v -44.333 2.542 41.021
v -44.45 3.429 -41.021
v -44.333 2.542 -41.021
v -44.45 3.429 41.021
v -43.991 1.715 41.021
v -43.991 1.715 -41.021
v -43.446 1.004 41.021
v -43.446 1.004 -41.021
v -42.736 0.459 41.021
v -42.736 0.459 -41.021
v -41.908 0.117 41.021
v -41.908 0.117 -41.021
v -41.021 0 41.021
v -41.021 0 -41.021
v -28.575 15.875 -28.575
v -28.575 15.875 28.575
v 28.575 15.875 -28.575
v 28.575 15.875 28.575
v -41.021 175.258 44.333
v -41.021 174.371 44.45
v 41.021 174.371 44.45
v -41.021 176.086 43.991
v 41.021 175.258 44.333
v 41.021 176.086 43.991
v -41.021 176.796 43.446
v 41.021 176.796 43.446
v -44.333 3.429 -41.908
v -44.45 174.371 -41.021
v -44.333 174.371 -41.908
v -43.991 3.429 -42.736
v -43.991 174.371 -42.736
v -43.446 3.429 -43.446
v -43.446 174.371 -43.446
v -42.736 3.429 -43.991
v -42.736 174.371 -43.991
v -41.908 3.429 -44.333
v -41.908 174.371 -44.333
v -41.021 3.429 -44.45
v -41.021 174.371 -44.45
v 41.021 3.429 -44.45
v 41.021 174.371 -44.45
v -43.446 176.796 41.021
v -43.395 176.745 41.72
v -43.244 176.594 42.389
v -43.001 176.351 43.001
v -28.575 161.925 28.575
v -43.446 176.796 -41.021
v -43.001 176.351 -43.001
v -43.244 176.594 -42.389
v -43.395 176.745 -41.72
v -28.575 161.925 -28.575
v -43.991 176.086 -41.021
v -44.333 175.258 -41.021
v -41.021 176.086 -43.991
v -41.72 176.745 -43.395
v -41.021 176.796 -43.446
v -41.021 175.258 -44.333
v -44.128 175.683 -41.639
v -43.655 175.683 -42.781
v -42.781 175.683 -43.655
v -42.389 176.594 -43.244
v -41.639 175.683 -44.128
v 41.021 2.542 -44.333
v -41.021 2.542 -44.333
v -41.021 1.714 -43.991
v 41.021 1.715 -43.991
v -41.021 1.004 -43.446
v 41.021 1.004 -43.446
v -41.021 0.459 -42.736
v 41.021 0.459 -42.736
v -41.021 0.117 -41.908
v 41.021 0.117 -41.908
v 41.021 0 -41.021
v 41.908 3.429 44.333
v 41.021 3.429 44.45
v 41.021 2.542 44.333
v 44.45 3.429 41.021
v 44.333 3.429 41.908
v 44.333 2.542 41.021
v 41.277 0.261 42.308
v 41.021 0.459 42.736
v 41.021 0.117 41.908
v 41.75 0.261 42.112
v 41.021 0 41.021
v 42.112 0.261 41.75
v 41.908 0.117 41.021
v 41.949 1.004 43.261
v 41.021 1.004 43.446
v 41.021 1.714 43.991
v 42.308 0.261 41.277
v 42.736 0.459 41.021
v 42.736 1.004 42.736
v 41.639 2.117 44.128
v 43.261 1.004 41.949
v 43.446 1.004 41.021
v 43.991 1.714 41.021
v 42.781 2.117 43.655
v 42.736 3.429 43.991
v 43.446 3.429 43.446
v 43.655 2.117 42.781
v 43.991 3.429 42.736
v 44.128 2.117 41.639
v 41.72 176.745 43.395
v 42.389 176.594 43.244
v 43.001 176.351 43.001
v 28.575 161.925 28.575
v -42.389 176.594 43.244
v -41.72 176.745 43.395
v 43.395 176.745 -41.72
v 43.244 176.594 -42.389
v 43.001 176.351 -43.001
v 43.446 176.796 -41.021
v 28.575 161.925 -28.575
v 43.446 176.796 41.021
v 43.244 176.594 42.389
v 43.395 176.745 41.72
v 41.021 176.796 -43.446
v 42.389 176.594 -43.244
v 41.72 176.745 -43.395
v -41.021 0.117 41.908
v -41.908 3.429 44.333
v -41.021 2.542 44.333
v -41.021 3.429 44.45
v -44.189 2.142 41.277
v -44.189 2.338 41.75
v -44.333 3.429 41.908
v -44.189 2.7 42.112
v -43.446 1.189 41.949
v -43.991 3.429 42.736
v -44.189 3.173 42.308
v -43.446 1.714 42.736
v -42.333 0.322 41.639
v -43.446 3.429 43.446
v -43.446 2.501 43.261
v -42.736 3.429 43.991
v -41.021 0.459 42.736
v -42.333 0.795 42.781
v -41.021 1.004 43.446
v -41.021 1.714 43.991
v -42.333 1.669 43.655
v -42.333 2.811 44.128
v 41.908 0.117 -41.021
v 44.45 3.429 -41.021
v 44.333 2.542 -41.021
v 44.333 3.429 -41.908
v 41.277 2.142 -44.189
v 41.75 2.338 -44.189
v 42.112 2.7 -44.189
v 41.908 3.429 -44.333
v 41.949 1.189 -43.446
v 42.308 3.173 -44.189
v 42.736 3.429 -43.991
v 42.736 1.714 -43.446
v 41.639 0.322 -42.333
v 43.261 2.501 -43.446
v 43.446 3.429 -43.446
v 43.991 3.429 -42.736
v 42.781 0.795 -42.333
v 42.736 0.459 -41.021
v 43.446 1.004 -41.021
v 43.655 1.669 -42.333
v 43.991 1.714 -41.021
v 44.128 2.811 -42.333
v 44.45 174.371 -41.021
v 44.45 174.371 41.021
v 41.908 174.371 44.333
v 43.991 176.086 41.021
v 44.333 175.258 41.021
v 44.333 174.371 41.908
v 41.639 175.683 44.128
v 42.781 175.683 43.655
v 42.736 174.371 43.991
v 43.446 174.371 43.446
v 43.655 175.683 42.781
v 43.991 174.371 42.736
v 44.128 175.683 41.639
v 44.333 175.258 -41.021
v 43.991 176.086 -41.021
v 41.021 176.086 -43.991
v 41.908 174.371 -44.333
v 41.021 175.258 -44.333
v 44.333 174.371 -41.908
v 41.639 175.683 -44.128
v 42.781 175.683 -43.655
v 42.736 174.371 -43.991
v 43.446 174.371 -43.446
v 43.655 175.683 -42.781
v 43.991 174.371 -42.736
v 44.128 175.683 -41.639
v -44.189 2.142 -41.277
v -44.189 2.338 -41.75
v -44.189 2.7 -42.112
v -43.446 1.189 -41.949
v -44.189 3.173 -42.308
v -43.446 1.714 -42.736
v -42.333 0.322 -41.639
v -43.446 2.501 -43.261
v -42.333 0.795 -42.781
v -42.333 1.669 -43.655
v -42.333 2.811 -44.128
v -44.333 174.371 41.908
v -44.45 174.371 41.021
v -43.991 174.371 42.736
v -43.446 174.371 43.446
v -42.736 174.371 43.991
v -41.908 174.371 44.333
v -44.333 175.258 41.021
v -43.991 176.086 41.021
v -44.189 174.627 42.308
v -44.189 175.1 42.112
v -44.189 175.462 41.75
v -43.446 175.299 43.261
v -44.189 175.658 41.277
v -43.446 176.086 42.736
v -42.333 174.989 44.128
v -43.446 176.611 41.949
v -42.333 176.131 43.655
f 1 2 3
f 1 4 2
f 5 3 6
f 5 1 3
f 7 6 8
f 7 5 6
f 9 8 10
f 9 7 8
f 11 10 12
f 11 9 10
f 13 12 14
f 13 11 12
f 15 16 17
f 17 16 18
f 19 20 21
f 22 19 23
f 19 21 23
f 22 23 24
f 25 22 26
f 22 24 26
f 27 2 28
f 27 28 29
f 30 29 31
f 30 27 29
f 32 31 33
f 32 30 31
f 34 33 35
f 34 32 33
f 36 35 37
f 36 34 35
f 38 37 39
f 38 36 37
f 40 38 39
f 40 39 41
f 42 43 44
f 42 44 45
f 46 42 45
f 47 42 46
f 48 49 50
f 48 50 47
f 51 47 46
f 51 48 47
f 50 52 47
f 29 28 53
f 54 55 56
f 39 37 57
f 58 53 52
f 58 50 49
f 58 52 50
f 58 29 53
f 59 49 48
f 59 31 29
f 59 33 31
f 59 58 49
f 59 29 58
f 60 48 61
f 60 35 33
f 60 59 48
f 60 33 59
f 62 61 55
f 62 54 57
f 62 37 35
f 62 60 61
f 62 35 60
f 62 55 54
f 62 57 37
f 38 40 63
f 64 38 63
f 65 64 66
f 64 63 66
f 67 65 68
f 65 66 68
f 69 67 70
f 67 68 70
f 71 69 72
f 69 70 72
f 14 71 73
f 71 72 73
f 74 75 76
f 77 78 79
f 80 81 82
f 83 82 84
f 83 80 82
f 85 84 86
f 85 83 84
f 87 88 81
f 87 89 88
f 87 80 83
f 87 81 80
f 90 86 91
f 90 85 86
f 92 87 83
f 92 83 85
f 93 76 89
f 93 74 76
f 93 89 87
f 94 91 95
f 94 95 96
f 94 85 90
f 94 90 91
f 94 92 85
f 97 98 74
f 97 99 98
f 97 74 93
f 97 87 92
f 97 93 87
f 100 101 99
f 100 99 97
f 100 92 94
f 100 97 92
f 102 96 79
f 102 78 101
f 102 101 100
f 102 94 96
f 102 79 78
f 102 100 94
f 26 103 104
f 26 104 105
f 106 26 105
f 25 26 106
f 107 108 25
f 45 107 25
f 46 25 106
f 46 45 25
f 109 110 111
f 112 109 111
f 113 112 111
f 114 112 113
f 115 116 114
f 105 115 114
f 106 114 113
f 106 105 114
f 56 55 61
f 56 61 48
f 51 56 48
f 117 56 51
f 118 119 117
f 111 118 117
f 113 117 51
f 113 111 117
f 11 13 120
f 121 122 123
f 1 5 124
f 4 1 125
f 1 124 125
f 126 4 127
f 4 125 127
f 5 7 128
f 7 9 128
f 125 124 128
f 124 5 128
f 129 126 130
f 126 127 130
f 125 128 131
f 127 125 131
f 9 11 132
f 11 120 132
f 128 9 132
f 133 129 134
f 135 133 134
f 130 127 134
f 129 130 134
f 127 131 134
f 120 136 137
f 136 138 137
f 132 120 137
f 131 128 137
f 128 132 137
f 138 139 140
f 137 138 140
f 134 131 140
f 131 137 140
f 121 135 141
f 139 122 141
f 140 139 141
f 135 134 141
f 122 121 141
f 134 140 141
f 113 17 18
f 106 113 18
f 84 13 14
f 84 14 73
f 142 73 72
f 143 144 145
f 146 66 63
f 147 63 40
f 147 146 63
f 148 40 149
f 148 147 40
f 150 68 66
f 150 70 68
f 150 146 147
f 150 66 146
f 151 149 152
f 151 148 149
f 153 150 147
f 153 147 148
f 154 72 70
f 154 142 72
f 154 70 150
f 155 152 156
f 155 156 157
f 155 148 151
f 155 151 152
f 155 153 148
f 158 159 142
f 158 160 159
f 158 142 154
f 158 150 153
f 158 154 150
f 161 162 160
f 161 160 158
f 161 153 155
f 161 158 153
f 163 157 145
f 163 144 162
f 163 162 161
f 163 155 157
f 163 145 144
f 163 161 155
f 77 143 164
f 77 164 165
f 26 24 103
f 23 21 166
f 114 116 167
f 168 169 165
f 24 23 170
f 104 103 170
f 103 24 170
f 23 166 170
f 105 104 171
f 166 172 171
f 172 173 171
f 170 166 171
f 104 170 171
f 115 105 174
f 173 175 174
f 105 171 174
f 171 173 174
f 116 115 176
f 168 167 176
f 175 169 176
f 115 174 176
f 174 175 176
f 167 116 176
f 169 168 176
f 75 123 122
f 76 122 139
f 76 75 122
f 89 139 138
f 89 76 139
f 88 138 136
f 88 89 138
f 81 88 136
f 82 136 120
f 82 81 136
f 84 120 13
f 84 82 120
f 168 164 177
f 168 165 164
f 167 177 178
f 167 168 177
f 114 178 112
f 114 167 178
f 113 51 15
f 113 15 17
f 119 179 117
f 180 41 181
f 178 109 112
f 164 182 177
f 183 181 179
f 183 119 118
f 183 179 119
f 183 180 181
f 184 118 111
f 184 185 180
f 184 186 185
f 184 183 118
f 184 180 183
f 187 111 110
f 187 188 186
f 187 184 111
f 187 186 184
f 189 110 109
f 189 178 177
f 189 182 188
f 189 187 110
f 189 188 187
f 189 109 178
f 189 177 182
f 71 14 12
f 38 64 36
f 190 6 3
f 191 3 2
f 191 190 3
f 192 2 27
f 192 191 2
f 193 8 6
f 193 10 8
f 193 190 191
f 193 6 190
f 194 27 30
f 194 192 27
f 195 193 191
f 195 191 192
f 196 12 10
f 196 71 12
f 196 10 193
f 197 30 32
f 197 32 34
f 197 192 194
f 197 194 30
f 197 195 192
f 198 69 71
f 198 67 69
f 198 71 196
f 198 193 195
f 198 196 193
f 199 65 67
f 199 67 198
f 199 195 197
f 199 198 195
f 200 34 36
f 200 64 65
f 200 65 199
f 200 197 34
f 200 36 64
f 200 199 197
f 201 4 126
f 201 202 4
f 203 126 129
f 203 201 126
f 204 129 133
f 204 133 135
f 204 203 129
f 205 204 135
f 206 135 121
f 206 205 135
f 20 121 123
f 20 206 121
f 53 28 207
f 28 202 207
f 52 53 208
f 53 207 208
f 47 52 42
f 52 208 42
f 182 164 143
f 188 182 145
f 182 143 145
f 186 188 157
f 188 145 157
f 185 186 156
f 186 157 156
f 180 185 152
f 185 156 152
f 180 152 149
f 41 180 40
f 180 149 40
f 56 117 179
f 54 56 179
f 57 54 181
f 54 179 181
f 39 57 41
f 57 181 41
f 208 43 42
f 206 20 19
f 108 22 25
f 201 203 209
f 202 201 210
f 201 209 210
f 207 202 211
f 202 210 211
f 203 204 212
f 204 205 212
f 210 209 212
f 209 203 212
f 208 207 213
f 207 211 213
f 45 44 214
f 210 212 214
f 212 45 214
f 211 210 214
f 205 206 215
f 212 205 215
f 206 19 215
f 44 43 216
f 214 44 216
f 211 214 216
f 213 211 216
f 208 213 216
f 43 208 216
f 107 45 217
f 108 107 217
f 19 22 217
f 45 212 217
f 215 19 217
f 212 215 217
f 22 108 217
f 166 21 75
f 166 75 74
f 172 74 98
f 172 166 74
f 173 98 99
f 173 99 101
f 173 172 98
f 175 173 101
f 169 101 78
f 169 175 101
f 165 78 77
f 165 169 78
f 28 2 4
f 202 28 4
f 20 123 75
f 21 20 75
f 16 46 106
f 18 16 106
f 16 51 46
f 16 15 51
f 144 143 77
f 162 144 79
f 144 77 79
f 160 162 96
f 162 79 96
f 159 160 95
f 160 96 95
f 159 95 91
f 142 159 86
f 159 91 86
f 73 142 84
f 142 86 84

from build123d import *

# Parameters (mm, degrees)
F0_W         = 88.9
F0_H         = 88.9
F0_W_2       = 57.15
F0_H_2       = 57.15
F1_DEPTH     = 177.8
F2_DEPTH     = 15.875
F3_R         = 3.429
F4_T1_DEPTH  = 57.15
F4_T3_DEPTH  = 57.15
F4_T9_DEPTH  = 97.975467434
F4_T13_DEPTH = 97.975467434
F4_T20_DEPTH = 97.975467434
F4_T24_DEPTH = 97.975467434
F4_T31_DEPTH = 97.975467434
F4_T35_DEPTH = 97.975467434
F4_T42_DEPTH = 97.975467434
F4_T46_DEPTH = 97.975467434


# Not quite as in the source:
# - a fillet or chamfer that OpenCascade refuses, or shapes differently, is made with other operations: its cross-section is extruded or revolved along the edge and cut away or added


with BuildPart() as f1:
    # F0 (on Front) → F1 (new body)
    with BuildSketch(Plane.XZ):
        Rectangle(F0_W, F0_H)
        Rectangle(F0_W_2, F0_H_2, mode=Mode.SUBTRACT)
    extrude(amount=-F1_DEPTH)

    # F0 (on Front) → F2 (join)
    with BuildSketch(Plane.XZ):
        Rectangle(F0_W, F0_H)
        Rectangle(F0_W_2, F0_H_2, mode=Mode.SUBTRACT)
        Rectangle(F0_W_2, F0_H_2)
    extrude(amount=-F2_DEPTH)

    # F3
    f3_edges = [f1.edges().sort_by_distance(p)[0] for p in [
        (44.45, 88.9, 44.45),
        (0, 0, 44.45),
        (44.45, 0, 0),
        (0, 0, -44.45),
        (44.45, 88.9, -44.45),
        (-44.45, 0, 0),
        (-44.45, 88.9, -44.45),
        (0, 177.8, 44.45),
        (-44.45, 88.9, 44.45),
        (-44.45, 177.8, 0),
        (0, 177.8, -44.45),
        (44.45, 177.8, 0),
    ]]
    fillet(f3_edges, radius=F3_R)

    # F4: chamfer of 15.875 on 4 edges, made by hand

    # F4_s2 → F4_t1 (cut)
    with BuildSketch(Plane.XY.offset(-28.575)):
        with BuildLine():
            Line((-44.8990128061, 178.2490128061), (-28.1259871939, 161.4759871939))
            Line((-28.1259871939, 161.4759871939), (-27.8084871939, 161.4759871939))
            ThreePointArc((-27.8084871939, 161.4759871939), (-28.2575, 169.637993597), (-28.2575, 177.8))
            Line((-28.2575, 177.8), (-28.575, 178.1175))
            ThreePointArc((-28.575, 178.1175), (-36.737006403, 178.1175), (-44.8990128061, 178.5665128061))
            Line((-44.8990128061, 178.5665128061), (-44.8990128061, 178.2490128061))
        make_face()
        with BuildLine():
            Line((44.8990128061, 178.2490128061), (28.1259871939, 161.4759871939))
            Line((28.1259871939, 161.4759871939), (27.8084871939, 161.4759871939))
            ThreePointArc((27.8084871939, 161.4759871939), (28.2575, 169.637993597), (28.2575, 177.8))
            Line((28.2575, 177.8), (28.575, 178.1175))
            ThreePointArc((28.575, 178.1175), (36.737006403, 178.1175), (44.8990128061, 178.5665128061))
            Line((44.8990128061, 178.5665128061), (44.8990128061, 178.2490128061))
        make_face()
    extrude(amount=F4_T1_DEPTH, mode=Mode.SUBTRACT)

    # F4_s4 → F4_t3 (cut)
    with BuildSketch(Plane.YZ.offset(-28.575)):
        with BuildLine():
            Line((178.2490128061, -44.8990128061), (161.4759871939, -28.1259871939))
            Line((161.4759871939, -28.1259871939), (161.4759871939, -27.8084871939))
            ThreePointArc((161.4759871939, -27.8084871939), (169.637993597, -28.2575), (177.8, -28.2575))
            Line((177.8, -28.2575), (178.1175, -28.575))
            ThreePointArc((178.1175, -28.575), (178.1175, -36.737006403), (178.5665128061, -44.8990128061))
            Line((178.5665128061, -44.8990128061), (178.2490128061, -44.8990128061))
        make_face()
        with BuildLine():
            Line((178.2490128061, 44.8990128061), (161.4759871939, 28.1259871939))
            Line((161.4759871939, 28.1259871939), (161.4759871939, 27.8084871939))
            ThreePointArc((161.4759871939, 27.8084871939), (169.637993597, 28.2575), (177.8, 28.2575))
            Line((177.8, 28.2575), (178.1175, 28.575))
            ThreePointArc((178.1175, 28.575), (178.1175, 36.737006403), (178.5665128061, 44.8990128061))
            Line((178.5665128061, 44.8990128061), (178.2490128061, 44.8990128061))
        make_face()
    extrude(amount=F4_T3_DEPTH, mode=Mode.SUBTRACT)


with BuildPart() as f4_tool7:
    # F4_s8 → F4_t9 (new body)
    with BuildSketch(Plane.XY.offset(-69.400467434)):
        with BuildLine():
            Line((-44.8990128061, 178.2490128061), (-28.1259871939, 161.4759871939))
            Line((-28.1259871939, 161.4759871939), (-27.8084871939, 161.4759871939))
            ThreePointArc((-27.8084871939, 161.4759871939), (-28.2575, 169.637993597), (-28.2575, 177.8))
            Line((-28.2575, 177.8), (-28.575, 178.1175))
            ThreePointArc((-28.575, 178.1175), (-36.737006403, 178.1175), (-44.8990128061, 178.5665128061))
            Line((-44.8990128061, 178.5665128061), (-44.8990128061, 178.2490128061))
        make_face()
    extrude(amount=F4_T9_DEPTH)

    split(bisect_by=Plane.XY.offset(-28.575), keep=Keep.BOTTOM)


with BuildPart() as f4_tool11:
    # F4_s12 → F4_t13 (new body)
    with BuildSketch(Plane.YZ.offset(28.575)):
        with BuildLine():
            Line((178.2490128061, -44.8990128061), (161.4759871939, -28.1259871939))
            Line((161.4759871939, -28.1259871939), (161.4759871939, -27.8084871939))
            ThreePointArc((161.4759871939, -27.8084871939), (169.637993597, -28.2575), (177.8, -28.2575))
            Line((177.8, -28.2575), (178.1175, -28.575))
            ThreePointArc((178.1175, -28.575), (178.1175, -36.737006403), (178.5665128061, -44.8990128061))
            Line((178.5665128061, -44.8990128061), (178.2490128061, -44.8990128061))
        make_face()
    extrude(amount=-F4_T13_DEPTH)

    split(bisect_by=Plane.YZ.offset(-28.575), keep=Keep.BOTTOM)


with BuildPart() as f4_tool7_1:
    add(f4_tool7.part)

    # F4_t15: intersect F4_tool11
    add(f4_tool11.part, mode=Mode.INTERSECT)


with BuildPart() as f1_1:
    add(f1.part)

    # F4_t5: cut F4_tool7
    add(f4_tool7_1.part, mode=Mode.SUBTRACT)


with BuildPart() as f4_tool18:
    # F4_s19 → F4_t20 (new body)
    with BuildSketch(Plane.XY.offset(-28.575)):
        with BuildLine():
            Line((-44.8990128061, 178.2490128061), (-28.1259871939, 161.4759871939))
            Line((-28.1259871939, 161.4759871939), (-27.8084871939, 161.4759871939))
            ThreePointArc((-27.8084871939, 161.4759871939), (-28.2575, 169.637993597), (-28.2575, 177.8))
            Line((-28.2575, 177.8), (-28.575, 178.1175))
            ThreePointArc((-28.575, 178.1175), (-36.737006403, 178.1175), (-44.8990128061, 178.5665128061))
            Line((-44.8990128061, 178.5665128061), (-44.8990128061, 178.2490128061))
        make_face()
    extrude(amount=F4_T20_DEPTH)

    split(bisect_by=Plane.XY.offset(28.575), keep=Keep.TOP)


with BuildPart() as f4_tool22:
    # F4_s23 → F4_t24 (new body)
    with BuildSketch(Plane.YZ.offset(-69.400467434)):
        with BuildLine():
            Line((178.2490128061, 44.8990128061), (161.4759871939, 28.1259871939))
            Line((161.4759871939, 28.1259871939), (161.4759871939, 27.8084871939))
            ThreePointArc((161.4759871939, 27.8084871939), (169.637993597, 28.2575), (177.8, 28.2575))
            Line((177.8, 28.2575), (178.1175, 28.575))
            ThreePointArc((178.1175, 28.575), (178.1175, 36.737006403), (178.5665128061, 44.8990128061))
            Line((178.5665128061, 44.8990128061), (178.2490128061, 44.8990128061))
        make_face()
    extrude(amount=F4_T24_DEPTH)

    split(bisect_by=Plane.YZ.offset(-28.575), keep=Keep.BOTTOM)


with BuildPart() as f4_tool18_1:
    add(f4_tool18.part)

    # F4_t26: intersect F4_tool22
    add(f4_tool22.part, mode=Mode.INTERSECT)


with BuildPart() as f1_2:
    add(f1_1.part)

    # F4_t16: cut F4_tool18
    add(f4_tool18_1.part, mode=Mode.SUBTRACT)


with BuildPart() as f4_tool29:
    # F4_s30 → F4_t31 (new body)
    with BuildSketch(Plane.XY.offset(28.575)):
        with BuildLine():
            Line((44.8990128061, 178.2490128061), (28.1259871939, 161.4759871939))
            Line((28.1259871939, 161.4759871939), (27.8084871939, 161.4759871939))
            ThreePointArc((27.8084871939, 161.4759871939), (28.2575, 169.637993597), (28.2575, 177.8))
            Line((28.2575, 177.8), (28.575, 178.1175))
            ThreePointArc((28.575, 178.1175), (36.737006403, 178.1175), (44.8990128061, 178.5665128061))
            Line((44.8990128061, 178.5665128061), (44.8990128061, 178.2490128061))
        make_face()
    extrude(amount=-F4_T31_DEPTH)

    split(bisect_by=Plane.XY.offset(-28.575), keep=Keep.BOTTOM)


with BuildPart() as f4_tool33:
    # F4_s34 → F4_t35 (new body)
    with BuildSketch(Plane.YZ.offset(69.400467434)):
        with BuildLine():
            Line((178.2490128061, -44.8990128061), (161.4759871939, -28.1259871939))
            Line((161.4759871939, -28.1259871939), (161.4759871939, -27.8084871939))
            ThreePointArc((161.4759871939, -27.8084871939), (169.637993597, -28.2575), (177.8, -28.2575))
            Line((177.8, -28.2575), (178.1175, -28.575))
            ThreePointArc((178.1175, -28.575), (178.1175, -36.737006403), (178.5665128061, -44.8990128061))
            Line((178.5665128061, -44.8990128061), (178.2490128061, -44.8990128061))
        make_face()
    extrude(amount=-F4_T35_DEPTH)

    split(bisect_by=Plane.YZ.offset(28.575), keep=Keep.TOP)


with BuildPart() as f4_tool29_1:
    add(f4_tool29.part)

    # F4_t37: intersect F4_tool33
    add(f4_tool33.part, mode=Mode.INTERSECT)


with BuildPart() as f1_3:
    add(f1_2.part)

    # F4_t27: cut F4_tool29
    add(f4_tool29_1.part, mode=Mode.SUBTRACT)


with BuildPart() as f4_tool40:
    # F4_s41 → F4_t42 (new body)
    with BuildSketch(Plane.YZ.offset(-28.575)):
        with BuildLine():
            Line((178.2490128061, 44.8990128061), (161.4759871939, 28.1259871939))
            Line((161.4759871939, 28.1259871939), (161.4759871939, 27.8084871939))
            ThreePointArc((161.4759871939, 27.8084871939), (169.637993597, 28.2575), (177.8, 28.2575))
            Line((177.8, 28.2575), (178.1175, 28.575))
            ThreePointArc((178.1175, 28.575), (178.1175, 36.737006403), (178.5665128061, 44.8990128061))
            Line((178.5665128061, 44.8990128061), (178.2490128061, 44.8990128061))
        make_face()
    extrude(amount=F4_T42_DEPTH)

    split(bisect_by=Plane.YZ.offset(28.575), keep=Keep.TOP)


with BuildPart() as f4_tool44:
    # F4_s45 → F4_t46 (new body)
    with BuildSketch(Plane.XY.offset(69.400467434)):
        with BuildLine():
            Line((44.8990128061, 178.2490128061), (28.1259871939, 161.4759871939))
            Line((28.1259871939, 161.4759871939), (27.8084871939, 161.4759871939))
            ThreePointArc((27.8084871939, 161.4759871939), (28.2575, 169.637993597), (28.2575, 177.8))
            Line((28.2575, 177.8), (28.575, 178.1175))
            ThreePointArc((28.575, 178.1175), (36.737006403, 178.1175), (44.8990128061, 178.5665128061))
            Line((44.8990128061, 178.5665128061), (44.8990128061, 178.2490128061))
        make_face()
    extrude(amount=-F4_T46_DEPTH)

    split(bisect_by=Plane.XY.offset(28.575), keep=Keep.TOP)


with BuildPart() as f4_tool40_1:
    add(f4_tool40.part)

    # F4_t48: intersect F4_tool44
    add(f4_tool44.part, mode=Mode.INTERSECT)


with BuildPart() as f1_4:
    add(f1_3.part)

    # F4_t38: cut F4_tool40
    add(f4_tool40_1.part, mode=Mode.SUBTRACT)


solid = f1_4.part
